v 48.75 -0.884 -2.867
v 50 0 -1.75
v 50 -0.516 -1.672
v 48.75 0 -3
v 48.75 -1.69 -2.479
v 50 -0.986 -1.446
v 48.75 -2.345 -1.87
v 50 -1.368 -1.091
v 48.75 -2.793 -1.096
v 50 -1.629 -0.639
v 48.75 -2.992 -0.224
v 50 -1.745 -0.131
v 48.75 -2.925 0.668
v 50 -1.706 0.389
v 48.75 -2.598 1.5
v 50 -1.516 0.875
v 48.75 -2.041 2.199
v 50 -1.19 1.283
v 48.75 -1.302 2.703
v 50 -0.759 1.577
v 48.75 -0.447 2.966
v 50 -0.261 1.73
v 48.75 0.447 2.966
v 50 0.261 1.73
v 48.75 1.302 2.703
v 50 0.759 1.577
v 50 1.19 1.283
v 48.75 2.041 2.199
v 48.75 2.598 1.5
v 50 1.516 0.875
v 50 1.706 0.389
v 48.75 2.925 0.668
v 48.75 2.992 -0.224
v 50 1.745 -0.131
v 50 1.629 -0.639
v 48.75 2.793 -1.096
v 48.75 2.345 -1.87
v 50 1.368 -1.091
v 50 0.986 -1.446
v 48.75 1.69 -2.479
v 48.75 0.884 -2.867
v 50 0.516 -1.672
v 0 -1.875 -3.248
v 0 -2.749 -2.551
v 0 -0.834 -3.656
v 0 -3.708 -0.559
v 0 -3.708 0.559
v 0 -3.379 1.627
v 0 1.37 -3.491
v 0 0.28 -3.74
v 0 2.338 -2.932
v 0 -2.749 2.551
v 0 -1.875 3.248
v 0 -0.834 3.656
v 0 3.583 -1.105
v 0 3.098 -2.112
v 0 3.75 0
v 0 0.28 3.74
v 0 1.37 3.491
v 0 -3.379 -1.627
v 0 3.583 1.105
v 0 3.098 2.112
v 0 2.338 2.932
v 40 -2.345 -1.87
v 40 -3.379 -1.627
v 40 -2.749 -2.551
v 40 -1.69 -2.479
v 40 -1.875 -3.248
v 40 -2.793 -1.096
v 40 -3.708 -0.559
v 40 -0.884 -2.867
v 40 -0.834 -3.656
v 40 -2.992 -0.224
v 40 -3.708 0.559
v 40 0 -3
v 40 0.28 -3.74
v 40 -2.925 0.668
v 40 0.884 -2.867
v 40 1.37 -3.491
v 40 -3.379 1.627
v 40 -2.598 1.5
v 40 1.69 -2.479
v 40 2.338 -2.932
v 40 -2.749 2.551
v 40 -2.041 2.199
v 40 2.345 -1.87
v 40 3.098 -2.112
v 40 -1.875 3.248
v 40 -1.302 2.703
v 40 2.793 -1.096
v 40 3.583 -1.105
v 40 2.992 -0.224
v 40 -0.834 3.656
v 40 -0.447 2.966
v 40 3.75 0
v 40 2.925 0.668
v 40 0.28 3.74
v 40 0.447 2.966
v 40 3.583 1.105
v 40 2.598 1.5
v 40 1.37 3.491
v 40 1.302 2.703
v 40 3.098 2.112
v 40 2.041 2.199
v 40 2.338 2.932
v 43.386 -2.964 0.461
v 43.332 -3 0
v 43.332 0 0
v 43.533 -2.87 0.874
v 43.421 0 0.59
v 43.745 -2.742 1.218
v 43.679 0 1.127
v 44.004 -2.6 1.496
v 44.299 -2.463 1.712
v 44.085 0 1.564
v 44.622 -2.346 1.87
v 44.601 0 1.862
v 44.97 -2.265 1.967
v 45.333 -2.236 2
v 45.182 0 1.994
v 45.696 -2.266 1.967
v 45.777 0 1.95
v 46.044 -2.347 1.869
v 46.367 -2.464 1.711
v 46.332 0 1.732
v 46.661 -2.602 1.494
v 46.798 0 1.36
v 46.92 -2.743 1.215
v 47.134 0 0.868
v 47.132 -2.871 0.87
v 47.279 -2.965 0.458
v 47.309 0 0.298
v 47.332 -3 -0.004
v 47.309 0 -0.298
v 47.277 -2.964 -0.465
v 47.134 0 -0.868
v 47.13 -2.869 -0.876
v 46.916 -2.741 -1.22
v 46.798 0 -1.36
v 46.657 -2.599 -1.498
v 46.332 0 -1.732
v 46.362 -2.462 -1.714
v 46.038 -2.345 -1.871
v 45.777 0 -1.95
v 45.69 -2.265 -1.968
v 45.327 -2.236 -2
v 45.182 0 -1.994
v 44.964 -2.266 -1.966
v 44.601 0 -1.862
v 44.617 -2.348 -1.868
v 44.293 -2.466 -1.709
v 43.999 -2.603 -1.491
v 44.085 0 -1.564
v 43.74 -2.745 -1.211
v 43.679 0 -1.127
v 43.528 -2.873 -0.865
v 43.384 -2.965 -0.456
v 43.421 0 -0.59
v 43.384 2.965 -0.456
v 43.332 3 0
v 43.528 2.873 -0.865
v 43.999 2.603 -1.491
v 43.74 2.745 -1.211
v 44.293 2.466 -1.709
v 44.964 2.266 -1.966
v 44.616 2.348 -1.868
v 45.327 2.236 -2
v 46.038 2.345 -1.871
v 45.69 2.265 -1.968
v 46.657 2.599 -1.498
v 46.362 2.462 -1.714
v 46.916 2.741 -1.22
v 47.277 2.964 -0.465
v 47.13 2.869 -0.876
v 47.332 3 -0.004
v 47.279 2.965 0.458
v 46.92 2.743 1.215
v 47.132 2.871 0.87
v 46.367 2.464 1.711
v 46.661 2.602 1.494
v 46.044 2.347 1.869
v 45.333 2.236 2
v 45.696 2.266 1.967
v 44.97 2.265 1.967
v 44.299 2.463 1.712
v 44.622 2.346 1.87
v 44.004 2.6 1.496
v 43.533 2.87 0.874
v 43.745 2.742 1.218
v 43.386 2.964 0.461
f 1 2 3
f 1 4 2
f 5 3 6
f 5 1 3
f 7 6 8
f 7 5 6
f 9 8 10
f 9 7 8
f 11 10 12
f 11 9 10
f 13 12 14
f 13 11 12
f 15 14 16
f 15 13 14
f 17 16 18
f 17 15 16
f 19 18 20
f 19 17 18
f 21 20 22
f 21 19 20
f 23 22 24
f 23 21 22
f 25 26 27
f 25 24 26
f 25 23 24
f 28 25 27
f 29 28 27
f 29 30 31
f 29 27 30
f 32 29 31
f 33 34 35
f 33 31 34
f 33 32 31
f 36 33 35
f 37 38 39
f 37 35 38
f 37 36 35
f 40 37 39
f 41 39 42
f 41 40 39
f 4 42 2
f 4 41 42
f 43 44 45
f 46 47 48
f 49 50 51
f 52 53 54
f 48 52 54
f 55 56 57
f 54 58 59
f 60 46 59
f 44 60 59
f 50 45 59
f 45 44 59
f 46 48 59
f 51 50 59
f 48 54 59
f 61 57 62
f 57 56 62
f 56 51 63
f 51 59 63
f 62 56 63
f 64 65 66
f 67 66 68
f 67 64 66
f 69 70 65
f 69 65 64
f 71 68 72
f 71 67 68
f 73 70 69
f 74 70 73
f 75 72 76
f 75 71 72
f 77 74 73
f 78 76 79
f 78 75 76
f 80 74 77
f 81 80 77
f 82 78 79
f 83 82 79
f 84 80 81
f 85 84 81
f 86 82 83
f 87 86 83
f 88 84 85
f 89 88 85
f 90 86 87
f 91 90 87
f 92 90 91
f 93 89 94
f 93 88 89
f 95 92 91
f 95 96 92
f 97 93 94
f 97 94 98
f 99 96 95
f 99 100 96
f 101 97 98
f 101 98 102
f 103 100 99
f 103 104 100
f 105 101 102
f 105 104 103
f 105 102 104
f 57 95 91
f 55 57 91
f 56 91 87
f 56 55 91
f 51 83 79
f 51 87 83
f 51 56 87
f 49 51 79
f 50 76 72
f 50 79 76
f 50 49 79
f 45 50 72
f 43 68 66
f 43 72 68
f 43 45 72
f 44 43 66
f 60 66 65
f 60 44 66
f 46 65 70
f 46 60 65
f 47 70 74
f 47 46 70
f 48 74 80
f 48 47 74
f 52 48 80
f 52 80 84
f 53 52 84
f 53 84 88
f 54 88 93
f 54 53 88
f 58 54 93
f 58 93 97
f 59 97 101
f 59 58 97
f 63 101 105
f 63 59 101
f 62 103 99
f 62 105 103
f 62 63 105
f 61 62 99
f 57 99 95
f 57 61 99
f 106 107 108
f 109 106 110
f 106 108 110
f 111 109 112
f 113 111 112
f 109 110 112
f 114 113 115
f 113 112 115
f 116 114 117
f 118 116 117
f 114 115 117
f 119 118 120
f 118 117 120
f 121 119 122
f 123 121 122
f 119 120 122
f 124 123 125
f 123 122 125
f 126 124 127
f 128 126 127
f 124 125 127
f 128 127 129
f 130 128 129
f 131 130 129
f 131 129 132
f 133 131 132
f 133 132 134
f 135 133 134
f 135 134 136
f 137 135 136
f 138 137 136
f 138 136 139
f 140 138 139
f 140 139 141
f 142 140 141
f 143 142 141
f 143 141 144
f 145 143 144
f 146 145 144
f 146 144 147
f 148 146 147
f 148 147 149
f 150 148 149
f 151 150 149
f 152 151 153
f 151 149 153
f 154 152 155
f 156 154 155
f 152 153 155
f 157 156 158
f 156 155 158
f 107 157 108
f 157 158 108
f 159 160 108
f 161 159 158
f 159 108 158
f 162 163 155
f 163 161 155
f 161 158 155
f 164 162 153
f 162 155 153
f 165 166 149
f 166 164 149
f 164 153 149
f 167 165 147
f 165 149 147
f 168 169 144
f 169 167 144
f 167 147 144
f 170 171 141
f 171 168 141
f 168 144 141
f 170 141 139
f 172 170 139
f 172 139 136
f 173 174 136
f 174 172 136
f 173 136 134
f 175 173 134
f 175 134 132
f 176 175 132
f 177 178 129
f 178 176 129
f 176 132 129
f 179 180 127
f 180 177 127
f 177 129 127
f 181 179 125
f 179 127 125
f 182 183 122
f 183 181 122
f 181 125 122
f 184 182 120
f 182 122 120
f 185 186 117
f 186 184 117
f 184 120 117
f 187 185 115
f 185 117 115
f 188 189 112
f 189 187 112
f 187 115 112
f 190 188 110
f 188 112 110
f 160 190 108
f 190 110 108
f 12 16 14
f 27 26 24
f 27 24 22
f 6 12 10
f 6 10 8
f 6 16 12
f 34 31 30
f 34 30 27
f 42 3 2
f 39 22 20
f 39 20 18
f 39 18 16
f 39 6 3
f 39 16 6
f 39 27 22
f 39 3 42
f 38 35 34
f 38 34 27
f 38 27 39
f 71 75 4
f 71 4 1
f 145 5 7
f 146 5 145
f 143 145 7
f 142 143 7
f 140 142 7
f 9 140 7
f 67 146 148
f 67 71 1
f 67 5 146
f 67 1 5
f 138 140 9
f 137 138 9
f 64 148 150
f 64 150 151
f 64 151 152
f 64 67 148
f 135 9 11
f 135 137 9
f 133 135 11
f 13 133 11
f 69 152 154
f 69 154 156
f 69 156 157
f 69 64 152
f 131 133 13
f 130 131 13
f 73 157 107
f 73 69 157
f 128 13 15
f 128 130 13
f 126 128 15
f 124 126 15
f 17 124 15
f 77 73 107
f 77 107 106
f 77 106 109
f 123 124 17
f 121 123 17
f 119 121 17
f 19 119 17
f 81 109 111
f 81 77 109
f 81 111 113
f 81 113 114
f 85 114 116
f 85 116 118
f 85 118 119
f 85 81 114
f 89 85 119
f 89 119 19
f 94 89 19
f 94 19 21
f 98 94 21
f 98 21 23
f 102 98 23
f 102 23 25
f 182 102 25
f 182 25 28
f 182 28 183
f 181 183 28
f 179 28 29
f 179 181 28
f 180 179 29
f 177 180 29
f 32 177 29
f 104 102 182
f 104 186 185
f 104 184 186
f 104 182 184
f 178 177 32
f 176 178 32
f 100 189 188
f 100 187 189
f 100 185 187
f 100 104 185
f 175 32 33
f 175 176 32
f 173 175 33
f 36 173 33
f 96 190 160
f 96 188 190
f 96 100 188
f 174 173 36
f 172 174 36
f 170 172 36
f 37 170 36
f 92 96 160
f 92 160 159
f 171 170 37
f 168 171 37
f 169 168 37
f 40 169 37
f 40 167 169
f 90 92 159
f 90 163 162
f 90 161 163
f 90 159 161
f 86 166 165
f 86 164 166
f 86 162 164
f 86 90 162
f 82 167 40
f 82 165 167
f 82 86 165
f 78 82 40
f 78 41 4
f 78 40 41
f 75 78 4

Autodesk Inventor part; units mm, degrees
ref_plane "YZ Plane" through (0, 0, 0) normal (1, 0, 0) x (0, 1, 0)
ref_plane "XY Plane" through (0, 0, 0) normal (0, 0, 1) x (1, 0, 0)
sketch "Sketch1" plane through (0, 0, 0) normal (1, 0, 0) x (0, 1, 0)
  circle A0 centre (0, 0) radius 3.75
  dimension "d0" = 7.5
extrude "Extrusion1" add sketch "Sketch1" along normal blind 40
sketch "Sketch2" plane through (40, 0, 0) normal (1, 0, 0) x (0, 0, -1)
  circle A0 centre (0, 0) radius 3
  dimension "d3" = 6
extrude "Extrusion2" add sketch "Sketch2" along normal blind 10
chamfer "Chamfer1" distance 1.25 angle 45 1 edges at (50, 0, 3)
ref_plane "Work Plane1" through (0, 0, 0) normal (0, 1, 0) x (-1, 0, 0)
sketch "Sketch3" plane through (0, 0, 0) normal (0, 1, 0) x (-1, 0, 0)
  circle A0 centre (-45.3317, 0) radius 2
  point P0 (0, 0)
  dimension "d10" = 4
extrude "Extrusion3" cut sketch "Sketch3" along normal mid plane 10
properties part number "2nd extender"
